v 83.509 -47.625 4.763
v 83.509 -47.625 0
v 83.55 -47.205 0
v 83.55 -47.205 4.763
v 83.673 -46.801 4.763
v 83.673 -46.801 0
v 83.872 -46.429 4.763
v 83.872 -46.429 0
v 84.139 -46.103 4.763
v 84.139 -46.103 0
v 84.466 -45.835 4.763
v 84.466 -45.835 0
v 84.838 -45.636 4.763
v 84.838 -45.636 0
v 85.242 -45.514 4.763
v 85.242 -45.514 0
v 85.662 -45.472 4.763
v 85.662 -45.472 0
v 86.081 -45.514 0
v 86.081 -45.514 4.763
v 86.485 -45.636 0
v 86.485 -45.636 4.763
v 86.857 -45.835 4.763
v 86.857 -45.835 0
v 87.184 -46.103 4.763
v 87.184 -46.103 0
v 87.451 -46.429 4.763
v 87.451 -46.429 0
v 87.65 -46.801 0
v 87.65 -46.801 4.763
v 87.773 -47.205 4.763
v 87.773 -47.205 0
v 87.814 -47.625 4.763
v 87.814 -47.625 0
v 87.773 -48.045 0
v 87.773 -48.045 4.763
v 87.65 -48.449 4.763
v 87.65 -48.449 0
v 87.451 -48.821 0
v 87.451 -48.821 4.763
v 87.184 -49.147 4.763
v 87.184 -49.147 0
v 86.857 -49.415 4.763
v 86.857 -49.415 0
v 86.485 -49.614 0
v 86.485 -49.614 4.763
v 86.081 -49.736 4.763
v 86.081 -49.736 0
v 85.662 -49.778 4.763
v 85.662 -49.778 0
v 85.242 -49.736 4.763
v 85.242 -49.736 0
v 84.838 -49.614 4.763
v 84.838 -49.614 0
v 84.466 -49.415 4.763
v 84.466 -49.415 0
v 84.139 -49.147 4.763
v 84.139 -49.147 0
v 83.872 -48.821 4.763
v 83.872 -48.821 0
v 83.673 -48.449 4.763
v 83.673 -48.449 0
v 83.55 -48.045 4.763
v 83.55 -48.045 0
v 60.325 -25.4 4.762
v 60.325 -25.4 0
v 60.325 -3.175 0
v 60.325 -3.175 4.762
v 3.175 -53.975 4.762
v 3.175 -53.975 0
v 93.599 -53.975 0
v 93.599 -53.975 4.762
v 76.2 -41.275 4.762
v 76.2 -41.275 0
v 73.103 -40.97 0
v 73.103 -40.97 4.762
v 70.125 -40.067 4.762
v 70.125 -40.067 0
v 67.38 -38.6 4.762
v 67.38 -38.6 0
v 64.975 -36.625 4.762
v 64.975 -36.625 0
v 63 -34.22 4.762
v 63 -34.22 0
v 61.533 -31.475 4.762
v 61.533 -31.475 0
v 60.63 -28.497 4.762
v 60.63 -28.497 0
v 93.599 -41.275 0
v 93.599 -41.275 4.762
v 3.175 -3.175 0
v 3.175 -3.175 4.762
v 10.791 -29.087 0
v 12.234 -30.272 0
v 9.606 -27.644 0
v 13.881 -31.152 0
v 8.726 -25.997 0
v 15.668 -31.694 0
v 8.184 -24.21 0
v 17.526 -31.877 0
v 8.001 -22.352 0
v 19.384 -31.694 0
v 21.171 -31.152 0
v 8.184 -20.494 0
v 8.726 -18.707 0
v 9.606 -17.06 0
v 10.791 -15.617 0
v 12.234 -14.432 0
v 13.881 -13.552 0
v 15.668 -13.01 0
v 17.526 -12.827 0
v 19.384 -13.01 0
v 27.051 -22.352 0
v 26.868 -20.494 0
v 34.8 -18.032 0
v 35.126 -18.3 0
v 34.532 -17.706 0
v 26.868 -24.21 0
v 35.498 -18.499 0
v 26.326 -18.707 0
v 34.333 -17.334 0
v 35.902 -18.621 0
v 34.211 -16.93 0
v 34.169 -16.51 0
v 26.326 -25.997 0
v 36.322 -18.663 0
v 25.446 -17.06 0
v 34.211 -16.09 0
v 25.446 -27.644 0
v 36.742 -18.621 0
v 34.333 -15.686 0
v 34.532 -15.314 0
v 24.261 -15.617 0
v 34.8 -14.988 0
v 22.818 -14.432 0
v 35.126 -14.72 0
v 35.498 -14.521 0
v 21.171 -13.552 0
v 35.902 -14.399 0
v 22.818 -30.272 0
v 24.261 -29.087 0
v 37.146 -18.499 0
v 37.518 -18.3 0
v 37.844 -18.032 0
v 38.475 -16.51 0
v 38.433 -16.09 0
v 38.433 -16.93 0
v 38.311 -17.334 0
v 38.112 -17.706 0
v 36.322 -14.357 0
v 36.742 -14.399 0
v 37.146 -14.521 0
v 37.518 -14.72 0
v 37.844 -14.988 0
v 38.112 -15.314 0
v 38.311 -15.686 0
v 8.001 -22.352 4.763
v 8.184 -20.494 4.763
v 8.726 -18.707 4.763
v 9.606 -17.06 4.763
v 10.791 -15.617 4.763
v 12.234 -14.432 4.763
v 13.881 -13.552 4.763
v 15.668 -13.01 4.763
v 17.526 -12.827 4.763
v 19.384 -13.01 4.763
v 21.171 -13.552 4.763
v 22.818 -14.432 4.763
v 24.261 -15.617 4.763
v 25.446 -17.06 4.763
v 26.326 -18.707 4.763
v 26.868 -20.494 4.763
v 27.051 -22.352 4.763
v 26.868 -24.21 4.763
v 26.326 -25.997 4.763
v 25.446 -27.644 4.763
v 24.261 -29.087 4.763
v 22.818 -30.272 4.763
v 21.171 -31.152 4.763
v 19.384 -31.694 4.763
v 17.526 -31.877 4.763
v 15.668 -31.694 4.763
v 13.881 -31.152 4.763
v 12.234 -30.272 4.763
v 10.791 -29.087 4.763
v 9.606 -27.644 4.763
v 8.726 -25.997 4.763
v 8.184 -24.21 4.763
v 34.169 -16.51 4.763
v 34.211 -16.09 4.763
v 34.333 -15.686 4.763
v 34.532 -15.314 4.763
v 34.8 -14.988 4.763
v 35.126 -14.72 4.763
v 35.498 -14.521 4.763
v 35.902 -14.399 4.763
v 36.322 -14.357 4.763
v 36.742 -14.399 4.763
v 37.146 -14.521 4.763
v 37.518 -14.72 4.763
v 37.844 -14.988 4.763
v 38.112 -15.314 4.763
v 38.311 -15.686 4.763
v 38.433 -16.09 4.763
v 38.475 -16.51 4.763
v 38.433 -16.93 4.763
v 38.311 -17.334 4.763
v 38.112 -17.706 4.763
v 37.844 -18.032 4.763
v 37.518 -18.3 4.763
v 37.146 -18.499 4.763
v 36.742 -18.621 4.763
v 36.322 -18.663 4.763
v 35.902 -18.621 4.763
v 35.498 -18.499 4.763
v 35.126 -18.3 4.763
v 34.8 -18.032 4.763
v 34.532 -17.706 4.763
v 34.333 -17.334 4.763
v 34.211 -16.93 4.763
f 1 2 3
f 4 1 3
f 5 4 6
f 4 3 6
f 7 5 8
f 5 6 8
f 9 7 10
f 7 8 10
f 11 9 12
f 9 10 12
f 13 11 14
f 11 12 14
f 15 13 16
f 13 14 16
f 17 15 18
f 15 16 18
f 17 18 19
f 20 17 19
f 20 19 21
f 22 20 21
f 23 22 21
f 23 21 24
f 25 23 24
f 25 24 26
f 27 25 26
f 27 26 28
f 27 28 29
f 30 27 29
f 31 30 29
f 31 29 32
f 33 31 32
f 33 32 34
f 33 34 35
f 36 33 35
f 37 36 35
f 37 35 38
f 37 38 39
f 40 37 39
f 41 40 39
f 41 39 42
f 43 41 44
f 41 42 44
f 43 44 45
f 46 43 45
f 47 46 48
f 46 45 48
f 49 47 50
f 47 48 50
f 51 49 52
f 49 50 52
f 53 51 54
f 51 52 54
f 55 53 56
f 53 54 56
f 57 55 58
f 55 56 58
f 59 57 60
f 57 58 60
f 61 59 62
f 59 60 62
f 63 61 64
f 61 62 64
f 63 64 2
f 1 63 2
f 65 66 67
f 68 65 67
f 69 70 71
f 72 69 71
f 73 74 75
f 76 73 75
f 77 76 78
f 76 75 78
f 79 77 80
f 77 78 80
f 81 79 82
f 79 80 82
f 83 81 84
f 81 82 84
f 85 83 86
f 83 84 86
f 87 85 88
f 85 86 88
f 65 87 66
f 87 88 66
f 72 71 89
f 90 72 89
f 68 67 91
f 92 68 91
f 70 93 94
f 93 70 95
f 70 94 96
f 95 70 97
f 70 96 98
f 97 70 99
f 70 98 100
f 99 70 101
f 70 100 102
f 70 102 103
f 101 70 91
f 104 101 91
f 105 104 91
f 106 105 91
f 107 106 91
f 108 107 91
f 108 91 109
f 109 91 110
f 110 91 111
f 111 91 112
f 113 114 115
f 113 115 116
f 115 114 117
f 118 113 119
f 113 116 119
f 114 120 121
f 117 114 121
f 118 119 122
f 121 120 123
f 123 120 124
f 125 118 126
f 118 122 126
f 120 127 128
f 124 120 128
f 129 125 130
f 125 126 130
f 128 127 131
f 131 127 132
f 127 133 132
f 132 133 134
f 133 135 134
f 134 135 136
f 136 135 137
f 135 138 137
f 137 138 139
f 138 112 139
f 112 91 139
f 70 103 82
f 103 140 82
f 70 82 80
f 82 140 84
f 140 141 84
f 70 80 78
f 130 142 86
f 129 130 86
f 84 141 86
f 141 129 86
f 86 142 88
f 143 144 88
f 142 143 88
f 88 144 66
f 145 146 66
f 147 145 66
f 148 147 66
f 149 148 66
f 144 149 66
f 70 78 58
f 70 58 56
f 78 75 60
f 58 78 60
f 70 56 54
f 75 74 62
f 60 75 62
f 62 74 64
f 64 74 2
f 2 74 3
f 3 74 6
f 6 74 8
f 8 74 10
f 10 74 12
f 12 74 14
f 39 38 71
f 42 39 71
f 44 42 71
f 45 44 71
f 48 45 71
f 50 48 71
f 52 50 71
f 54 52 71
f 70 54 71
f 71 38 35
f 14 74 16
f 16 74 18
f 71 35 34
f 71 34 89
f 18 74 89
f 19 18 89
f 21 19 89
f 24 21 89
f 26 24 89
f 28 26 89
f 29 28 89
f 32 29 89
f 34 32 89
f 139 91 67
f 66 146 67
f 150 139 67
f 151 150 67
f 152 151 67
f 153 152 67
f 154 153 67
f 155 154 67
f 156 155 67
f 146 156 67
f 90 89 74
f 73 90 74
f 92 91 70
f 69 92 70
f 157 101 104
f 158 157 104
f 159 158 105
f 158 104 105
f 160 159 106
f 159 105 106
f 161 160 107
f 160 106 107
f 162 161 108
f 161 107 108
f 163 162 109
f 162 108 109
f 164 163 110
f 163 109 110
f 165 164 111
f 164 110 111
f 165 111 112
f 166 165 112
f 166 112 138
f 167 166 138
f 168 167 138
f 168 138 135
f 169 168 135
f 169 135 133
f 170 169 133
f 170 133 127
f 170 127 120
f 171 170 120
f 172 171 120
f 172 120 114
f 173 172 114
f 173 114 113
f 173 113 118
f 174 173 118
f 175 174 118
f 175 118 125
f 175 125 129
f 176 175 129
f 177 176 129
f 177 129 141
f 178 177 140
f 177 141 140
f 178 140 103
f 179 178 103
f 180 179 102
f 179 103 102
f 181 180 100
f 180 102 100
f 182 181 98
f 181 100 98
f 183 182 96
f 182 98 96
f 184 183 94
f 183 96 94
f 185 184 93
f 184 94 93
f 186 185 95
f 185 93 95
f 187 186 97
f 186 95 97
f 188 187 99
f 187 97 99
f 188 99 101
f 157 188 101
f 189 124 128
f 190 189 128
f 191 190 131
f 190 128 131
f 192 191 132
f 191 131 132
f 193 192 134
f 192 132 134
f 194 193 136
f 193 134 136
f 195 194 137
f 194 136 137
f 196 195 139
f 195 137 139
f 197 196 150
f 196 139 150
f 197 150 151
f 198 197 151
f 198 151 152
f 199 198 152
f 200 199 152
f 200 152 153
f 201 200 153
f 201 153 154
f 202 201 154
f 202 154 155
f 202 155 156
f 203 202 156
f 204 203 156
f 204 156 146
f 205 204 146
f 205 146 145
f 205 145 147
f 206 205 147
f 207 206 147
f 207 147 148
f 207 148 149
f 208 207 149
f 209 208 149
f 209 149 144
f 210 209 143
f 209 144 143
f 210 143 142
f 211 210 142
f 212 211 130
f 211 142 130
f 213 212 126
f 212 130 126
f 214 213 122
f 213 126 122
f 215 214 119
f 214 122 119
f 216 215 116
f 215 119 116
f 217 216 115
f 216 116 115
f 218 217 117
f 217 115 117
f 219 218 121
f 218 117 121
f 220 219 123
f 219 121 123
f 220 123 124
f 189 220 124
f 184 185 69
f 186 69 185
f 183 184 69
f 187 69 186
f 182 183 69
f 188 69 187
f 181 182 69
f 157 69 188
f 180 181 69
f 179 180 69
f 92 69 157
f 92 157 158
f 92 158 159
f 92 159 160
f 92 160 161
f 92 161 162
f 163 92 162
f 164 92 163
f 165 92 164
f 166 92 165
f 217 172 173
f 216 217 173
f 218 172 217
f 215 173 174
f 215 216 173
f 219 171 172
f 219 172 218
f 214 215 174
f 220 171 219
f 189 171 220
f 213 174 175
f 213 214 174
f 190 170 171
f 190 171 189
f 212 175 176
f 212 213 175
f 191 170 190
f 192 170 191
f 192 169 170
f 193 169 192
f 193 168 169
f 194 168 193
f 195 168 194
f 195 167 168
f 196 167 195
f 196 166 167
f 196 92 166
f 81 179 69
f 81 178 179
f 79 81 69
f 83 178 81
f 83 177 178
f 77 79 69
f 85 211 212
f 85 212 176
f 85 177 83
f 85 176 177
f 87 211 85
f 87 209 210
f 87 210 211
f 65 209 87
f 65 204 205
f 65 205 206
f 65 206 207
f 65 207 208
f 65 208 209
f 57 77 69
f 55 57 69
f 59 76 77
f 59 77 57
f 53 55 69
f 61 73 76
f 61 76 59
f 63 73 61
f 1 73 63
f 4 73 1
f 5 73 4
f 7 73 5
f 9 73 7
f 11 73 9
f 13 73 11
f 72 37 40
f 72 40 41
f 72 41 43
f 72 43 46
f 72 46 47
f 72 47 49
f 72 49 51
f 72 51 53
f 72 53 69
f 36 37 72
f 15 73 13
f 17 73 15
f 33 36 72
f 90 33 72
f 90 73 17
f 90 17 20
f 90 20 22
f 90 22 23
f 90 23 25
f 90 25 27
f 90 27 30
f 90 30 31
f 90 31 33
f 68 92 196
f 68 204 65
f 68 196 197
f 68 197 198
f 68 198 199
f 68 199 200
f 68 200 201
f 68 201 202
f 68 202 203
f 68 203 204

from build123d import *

# Parameters (mm, degrees)
BOSS_EXTRUDE1_DEPTH         = 4.7625
F_3_4_0_75_DIAMETER_HOLE1_D = 19.05
F_6_CLEARANCE_HOLE1_D       = 4.3053


with BuildPart() as part:
    # Sketch1 → Boss-Extrude1 (new body)
    with BuildSketch(Plane.XY):
        with BuildLine():
            Line((93.599, -41.275), (76.2, -41.275))
            ThreePointArc((76.2, -41.275), (64.974679849, -36.625320151), (60.325, -25.4))
            Line((60.325, -25.4), (60.325, -3.175))
            Line((60.325, -3.175), (3.175, -3.175))
            Line((3.175, -3.175), (3.175, -53.975))
            Line((3.175, -53.975), (93.599, -53.975))
            Line((93.599, -53.975), (93.599, -41.275))
        make_face()
    extrude(amount=BOSS_EXTRUDE1_DEPTH)

    # 3/4 (0.75) Diameter Hole1 (through all)
    with Locations(Plane.XY.offset(4.7625)):
        with Locations((17.526, -22.352)):
            Hole(F_3_4_0_75_DIAMETER_HOLE1_D / 2)

    # #6 Clearance Hole1 (through all)
    with Locations(Plane.XY.offset(4.7625)):
        with Locations((36.322, -16.51), (85.6615, -47.625)):
            Hole(F_6_CLEARANCE_HOLE1_D / 2)


solid = part.part
